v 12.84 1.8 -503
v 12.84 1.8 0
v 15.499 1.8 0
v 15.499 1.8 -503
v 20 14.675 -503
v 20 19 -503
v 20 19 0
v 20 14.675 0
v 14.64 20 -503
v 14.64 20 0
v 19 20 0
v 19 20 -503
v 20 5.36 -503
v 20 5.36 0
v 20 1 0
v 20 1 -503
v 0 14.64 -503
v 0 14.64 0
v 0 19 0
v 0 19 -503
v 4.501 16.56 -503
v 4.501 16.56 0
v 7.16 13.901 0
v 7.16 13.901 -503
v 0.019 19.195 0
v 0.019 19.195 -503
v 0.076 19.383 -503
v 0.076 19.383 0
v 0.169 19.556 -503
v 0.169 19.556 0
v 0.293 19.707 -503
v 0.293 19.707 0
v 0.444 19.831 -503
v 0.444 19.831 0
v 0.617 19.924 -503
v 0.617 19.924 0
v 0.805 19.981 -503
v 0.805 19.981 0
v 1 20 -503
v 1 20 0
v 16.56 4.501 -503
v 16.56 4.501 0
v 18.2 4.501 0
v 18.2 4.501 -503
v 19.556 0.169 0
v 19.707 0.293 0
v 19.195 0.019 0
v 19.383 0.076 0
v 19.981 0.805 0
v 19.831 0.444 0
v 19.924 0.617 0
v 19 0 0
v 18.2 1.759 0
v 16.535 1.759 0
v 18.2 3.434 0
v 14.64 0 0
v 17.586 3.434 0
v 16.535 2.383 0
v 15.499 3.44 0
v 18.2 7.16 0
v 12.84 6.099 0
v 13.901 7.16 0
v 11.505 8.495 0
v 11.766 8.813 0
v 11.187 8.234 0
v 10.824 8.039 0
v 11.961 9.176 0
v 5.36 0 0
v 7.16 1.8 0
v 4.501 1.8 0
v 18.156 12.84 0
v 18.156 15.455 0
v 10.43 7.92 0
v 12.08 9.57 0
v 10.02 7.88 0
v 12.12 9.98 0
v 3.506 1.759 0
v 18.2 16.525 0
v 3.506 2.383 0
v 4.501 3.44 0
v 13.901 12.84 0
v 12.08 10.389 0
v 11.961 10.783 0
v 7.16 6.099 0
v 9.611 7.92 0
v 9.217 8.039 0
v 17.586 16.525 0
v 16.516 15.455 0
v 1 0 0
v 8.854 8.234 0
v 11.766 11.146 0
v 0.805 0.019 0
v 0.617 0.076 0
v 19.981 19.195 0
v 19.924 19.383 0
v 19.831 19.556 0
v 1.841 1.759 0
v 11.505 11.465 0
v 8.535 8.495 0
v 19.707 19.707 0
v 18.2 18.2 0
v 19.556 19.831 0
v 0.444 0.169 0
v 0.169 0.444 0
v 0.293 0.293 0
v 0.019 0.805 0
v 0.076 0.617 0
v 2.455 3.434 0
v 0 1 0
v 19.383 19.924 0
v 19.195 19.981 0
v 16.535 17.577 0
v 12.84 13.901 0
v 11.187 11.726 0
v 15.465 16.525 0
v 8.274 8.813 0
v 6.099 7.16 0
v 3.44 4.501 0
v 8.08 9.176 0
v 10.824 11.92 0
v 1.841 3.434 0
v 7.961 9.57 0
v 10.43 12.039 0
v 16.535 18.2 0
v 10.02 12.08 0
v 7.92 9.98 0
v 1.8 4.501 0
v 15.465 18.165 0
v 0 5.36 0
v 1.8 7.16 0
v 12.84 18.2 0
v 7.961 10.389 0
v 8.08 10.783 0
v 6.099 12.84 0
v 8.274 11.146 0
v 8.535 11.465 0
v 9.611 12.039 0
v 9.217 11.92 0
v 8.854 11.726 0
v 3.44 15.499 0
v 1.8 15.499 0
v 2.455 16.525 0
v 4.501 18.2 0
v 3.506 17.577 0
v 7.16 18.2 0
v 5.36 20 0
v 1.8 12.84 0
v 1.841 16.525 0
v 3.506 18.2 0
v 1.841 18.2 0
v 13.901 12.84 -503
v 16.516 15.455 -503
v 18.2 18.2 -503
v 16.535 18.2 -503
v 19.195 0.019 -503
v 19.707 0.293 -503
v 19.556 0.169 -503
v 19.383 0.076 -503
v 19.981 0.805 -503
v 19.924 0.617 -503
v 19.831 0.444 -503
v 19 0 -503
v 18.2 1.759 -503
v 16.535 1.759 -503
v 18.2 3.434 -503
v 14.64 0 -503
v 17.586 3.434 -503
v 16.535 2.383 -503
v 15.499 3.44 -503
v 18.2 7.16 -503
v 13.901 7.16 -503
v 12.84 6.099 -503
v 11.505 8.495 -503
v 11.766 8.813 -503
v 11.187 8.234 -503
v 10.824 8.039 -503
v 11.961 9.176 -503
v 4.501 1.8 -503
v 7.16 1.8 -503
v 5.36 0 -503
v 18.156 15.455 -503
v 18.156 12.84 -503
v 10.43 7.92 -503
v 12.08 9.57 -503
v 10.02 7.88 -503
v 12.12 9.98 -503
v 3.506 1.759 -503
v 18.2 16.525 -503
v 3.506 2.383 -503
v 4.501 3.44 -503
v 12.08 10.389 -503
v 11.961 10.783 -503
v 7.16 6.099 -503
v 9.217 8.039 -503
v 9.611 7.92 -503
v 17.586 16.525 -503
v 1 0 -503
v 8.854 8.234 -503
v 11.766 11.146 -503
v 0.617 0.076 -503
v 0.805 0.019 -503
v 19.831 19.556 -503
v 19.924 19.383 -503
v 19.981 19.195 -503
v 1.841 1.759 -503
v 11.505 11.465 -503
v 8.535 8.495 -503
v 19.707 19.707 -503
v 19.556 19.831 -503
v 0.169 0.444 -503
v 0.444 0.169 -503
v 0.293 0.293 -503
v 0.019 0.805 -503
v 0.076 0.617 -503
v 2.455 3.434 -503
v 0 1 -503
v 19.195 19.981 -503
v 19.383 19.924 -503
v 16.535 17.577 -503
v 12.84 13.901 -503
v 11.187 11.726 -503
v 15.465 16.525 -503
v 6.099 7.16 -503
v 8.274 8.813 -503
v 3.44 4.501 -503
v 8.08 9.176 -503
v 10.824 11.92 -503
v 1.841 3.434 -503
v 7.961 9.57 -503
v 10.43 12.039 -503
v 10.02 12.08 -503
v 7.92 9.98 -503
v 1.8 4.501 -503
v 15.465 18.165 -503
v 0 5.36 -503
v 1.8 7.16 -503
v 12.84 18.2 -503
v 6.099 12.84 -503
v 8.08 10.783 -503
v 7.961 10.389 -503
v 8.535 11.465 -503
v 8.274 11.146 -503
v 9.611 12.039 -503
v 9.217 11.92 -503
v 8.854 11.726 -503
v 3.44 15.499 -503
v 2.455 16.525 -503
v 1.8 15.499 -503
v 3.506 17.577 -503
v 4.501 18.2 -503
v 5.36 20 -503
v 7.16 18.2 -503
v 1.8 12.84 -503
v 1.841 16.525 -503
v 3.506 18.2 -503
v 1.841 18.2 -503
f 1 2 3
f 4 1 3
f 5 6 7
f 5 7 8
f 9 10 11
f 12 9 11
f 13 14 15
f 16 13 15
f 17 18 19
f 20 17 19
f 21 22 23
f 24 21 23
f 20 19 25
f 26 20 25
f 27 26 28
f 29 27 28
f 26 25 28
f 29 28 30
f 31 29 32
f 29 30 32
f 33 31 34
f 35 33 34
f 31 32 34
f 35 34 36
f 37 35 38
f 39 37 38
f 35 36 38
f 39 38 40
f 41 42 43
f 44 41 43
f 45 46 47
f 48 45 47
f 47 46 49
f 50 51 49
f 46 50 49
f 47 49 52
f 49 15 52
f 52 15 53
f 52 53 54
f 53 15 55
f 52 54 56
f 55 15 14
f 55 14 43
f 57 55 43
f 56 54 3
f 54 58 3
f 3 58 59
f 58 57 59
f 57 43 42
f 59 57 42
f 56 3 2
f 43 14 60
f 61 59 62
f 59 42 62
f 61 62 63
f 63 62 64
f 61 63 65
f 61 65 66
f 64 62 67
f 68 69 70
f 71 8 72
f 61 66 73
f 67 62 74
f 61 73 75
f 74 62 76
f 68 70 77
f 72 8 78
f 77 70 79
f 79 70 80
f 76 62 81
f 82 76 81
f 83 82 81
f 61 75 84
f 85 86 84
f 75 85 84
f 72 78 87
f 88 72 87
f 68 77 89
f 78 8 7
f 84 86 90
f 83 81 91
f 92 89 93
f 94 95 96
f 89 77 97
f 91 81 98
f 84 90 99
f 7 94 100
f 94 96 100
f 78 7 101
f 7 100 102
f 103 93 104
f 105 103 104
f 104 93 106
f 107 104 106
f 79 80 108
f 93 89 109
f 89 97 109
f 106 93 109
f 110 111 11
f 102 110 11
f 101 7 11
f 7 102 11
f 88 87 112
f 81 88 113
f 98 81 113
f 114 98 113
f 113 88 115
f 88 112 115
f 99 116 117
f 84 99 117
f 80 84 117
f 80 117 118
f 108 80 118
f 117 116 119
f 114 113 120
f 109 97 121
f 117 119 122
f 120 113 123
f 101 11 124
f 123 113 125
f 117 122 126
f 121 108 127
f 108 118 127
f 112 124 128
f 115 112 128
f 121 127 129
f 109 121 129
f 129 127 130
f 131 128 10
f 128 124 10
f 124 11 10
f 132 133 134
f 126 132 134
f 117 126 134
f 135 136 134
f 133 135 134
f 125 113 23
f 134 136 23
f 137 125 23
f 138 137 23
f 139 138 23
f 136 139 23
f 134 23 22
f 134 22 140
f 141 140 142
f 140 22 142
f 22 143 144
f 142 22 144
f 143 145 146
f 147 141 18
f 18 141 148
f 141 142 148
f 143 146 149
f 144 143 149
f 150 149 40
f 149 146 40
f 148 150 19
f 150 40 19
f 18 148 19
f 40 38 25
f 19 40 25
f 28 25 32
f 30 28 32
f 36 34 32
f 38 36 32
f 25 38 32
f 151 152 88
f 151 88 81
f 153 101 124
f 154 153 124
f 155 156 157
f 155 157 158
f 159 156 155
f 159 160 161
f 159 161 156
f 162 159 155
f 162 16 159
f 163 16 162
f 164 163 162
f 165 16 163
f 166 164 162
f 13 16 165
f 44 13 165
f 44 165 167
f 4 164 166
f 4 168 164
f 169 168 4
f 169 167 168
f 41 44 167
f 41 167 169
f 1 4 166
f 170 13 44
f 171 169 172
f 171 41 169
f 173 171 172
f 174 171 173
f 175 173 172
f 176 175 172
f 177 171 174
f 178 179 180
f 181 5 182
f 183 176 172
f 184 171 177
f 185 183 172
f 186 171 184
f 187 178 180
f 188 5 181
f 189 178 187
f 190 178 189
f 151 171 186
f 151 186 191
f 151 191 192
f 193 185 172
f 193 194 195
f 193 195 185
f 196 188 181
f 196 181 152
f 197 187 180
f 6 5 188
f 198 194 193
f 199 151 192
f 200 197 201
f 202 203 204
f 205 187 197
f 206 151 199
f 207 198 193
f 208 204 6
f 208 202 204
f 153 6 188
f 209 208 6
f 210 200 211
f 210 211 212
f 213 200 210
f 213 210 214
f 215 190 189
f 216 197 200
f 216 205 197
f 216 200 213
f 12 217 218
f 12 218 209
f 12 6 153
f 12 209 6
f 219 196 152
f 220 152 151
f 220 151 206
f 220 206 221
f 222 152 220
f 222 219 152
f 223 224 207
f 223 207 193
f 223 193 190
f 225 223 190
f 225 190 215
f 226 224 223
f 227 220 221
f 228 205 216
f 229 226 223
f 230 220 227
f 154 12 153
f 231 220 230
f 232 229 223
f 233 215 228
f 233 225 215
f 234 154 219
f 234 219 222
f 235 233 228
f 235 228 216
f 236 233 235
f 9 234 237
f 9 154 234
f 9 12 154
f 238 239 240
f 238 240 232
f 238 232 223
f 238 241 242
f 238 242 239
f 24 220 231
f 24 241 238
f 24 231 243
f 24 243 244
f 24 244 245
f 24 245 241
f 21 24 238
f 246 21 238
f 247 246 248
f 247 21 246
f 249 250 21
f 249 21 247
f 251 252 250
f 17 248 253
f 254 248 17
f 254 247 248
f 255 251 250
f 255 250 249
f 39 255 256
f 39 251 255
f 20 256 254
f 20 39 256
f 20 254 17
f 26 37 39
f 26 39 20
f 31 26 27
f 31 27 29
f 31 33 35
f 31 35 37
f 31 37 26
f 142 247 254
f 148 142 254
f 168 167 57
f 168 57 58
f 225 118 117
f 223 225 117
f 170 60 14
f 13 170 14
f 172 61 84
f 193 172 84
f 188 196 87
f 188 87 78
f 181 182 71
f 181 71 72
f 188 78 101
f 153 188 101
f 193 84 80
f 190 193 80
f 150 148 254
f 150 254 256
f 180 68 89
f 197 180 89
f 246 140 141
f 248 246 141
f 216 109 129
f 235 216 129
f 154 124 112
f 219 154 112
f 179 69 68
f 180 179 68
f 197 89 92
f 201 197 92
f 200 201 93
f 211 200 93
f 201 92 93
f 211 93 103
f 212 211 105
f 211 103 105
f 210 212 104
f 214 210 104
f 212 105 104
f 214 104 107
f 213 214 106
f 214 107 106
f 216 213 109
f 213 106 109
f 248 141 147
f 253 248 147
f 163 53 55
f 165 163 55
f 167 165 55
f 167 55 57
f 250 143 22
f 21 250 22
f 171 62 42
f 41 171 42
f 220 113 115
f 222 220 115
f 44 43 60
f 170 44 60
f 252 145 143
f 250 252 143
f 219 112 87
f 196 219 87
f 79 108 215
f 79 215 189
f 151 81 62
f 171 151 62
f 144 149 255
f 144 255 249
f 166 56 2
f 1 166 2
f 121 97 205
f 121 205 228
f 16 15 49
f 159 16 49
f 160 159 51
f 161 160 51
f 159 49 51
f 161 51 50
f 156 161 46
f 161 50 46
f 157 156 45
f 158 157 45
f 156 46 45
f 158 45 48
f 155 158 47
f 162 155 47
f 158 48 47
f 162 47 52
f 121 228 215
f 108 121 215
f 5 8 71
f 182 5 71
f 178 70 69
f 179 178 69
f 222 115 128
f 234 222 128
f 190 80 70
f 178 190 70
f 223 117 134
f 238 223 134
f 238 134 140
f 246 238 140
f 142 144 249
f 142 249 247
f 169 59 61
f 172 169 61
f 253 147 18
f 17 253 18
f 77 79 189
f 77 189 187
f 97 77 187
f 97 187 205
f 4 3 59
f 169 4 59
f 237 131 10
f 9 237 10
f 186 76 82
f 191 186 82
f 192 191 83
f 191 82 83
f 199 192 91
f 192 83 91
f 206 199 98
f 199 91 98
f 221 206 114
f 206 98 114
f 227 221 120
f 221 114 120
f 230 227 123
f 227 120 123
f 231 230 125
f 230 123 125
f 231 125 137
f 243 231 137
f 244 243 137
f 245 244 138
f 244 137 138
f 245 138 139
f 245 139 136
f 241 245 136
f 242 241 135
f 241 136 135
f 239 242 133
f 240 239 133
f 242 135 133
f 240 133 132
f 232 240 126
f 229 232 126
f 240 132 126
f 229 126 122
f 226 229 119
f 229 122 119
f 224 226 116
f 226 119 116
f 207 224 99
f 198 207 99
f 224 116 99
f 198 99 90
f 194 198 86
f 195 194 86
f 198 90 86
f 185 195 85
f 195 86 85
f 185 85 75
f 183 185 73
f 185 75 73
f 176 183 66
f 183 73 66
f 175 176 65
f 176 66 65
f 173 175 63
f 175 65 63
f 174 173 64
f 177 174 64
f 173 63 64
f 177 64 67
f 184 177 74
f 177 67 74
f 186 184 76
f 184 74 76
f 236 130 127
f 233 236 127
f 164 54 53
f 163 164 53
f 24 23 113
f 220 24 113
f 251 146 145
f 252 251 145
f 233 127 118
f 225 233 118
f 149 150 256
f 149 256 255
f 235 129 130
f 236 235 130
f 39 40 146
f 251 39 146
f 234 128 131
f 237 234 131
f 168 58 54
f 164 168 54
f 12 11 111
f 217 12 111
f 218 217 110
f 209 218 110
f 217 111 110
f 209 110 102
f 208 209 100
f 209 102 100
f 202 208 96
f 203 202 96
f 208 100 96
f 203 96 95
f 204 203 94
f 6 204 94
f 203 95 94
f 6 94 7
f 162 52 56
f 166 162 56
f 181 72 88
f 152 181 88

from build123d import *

# Parameters (mm, degrees)
SKETCH1_R           = 2.1
BOSS_EXTRUDE1_DEPTH = 503


with BuildPart() as part:
    # Sketch1 → Boss-Extrude1 (new body)
    with BuildSketch(Plane.XY):
        with BuildLine():
            Line((0, 1), (0, 5.36))
            Line((0, 5.36), (1.8, 7.16))
            Line((1.8, 7.16), (1.8, 4.500660172))
            Line((1.8, 4.500660172), (3.44, 4.500660172))
            Line((3.44, 4.500660172), (6.099339828, 7.16))
            Line((6.099339828, 7.16), (6.099339828, 12.84))
            Line((6.099339828, 12.84), (3.44, 15.499339828))
            Line((3.44, 15.499339828), (1.8, 15.499339828))
            Line((1.8, 15.499339828), (1.8, 12.84))
            Line((1.8, 12.84), (0, 14.64))
            Line((0, 14.64), (0, 19))
            ThreePointArc((0, 19), (0.292893219, 19.707106781), (1, 20))
            Line((1, 20), (5.36, 20))
            Line((5.36, 20), (7.16, 18.2))
            Line((7.16, 18.2), (4.500660172, 18.2))
            Line((4.500660172, 18.2), (4.500660172, 16.56))
            Line((4.500660172, 16.56), (7.16, 13.900660172))
            Line((7.16, 13.900660172), (12.84, 13.900660172))
            Line((12.84, 13.900660172), (15.464579042, 16.525239214))
            Line((15.464579042, 16.525239214), (15.464579042, 18.165239214))
            Line((15.464579042, 18.165239214), (12.84, 18.2))
            Line((12.84, 18.2), (14.64, 20))
            Line((14.64, 20), (19, 20))
            ThreePointArc((19, 20), (19.707106781, 19.707106781), (20, 19))
            Line((20, 19), (20, 14.674581351))
            Line((20, 14.674581351), (18.155899385, 12.84))
            Line((18.155899385, 12.84), (18.155899385, 15.455239214))
            Line((18.155899385, 15.455239214), (16.515899385, 15.455239214))
            Line((16.515899385, 15.455239214), (13.900660172, 12.84))
            Line((13.900660172, 12.84), (13.900660172, 7.16))
            Line((13.900660172, 7.16), (16.56, 4.500660172))
            Line((16.56, 4.500660172), (18.2, 4.500660172))
            Line((18.2, 4.500660172), (18.2, 7.16))
            Line((18.2, 7.16), (20, 5.36))
            Line((20, 5.36), (20, 1))
            ThreePointArc((20, 1), (19.707106781, 0.292893219), (19, 0))
            Line((19, 0), (14.64, 0))
            Line((14.64, 0), (12.84, 1.8))
            Line((12.84, 1.8), (15.499339828, 1.8))
            Line((15.499339828, 1.8), (15.499339828, 3.44))
            Line((15.499339828, 3.44), (12.84, 6.099339828))
            Line((12.84, 6.099339828), (7.16, 6.099339828))
            Line((7.16, 6.099339828), (4.500660172, 3.44))
            Line((4.500660172, 3.44), (4.500660172, 1.8))
            Line((4.500660172, 1.8), (7.16, 1.8))
            Line((7.16, 1.8), (5.36, 0))
            Line((5.36, 0), (1, 0))
            ThreePointArc((1, 0), (0.292893219, 0.292893219), (0, 1))
        make_face()
        with Locations((10.02040103, 9.97959897)):
            Circle(SKETCH1_R, mode=Mode.SUBTRACT)
        Polygon((16.534579042, 18.2), (16.534579042, 17.576559557), (17.585899385, 16.525239214), (18.2, 16.525239214), (18.2, 18.2), align=None, mode=Mode.SUBTRACT)
        Polygon((18.2, 1.75919794), (18.2, 3.433958726), (17.585899385, 3.433958726), (16.534579042, 2.382638382), (16.534579042, 1.75919794), align=None, mode=Mode.SUBTRACT)
        Polygon((2.454902675, 16.525239214), (1.84080206, 16.525239214), (1.84080206, 18.2), (3.506223018, 18.2), (3.506223018, 17.576559557), align=None, mode=Mode.SUBTRACT)
        Polygon((3.506223018, 1.75919794), (1.84080206, 1.75919794), (1.84080206, 3.433958726), (2.454902675, 3.433958726), (3.506223018, 2.382638382), align=None, mode=Mode.SUBTRACT)
    extrude(amount=-BOSS_EXTRUDE1_DEPTH)


solid = part.part
